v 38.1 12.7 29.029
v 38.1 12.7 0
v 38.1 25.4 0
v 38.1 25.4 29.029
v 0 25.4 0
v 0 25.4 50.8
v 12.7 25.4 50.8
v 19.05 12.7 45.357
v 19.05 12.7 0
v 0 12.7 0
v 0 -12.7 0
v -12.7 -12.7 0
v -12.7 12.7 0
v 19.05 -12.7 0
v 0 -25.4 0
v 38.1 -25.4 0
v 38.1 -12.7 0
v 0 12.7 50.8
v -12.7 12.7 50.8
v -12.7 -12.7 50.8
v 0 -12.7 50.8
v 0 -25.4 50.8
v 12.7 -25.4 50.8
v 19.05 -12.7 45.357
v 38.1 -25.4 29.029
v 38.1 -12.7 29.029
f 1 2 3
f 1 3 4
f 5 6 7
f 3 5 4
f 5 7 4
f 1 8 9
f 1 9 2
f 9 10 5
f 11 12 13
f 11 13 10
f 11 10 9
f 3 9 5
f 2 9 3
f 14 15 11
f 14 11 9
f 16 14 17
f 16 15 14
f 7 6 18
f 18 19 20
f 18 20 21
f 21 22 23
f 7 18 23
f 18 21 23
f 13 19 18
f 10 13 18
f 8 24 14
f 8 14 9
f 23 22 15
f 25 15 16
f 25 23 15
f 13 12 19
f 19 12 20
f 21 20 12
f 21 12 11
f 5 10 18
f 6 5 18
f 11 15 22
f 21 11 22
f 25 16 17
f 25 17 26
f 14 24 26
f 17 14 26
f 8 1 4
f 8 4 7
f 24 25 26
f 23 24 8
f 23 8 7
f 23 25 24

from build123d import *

# Parameters (mm, degrees)
F0_W     = 12.7
F0_H     = 50.8
F1_DEPTH = 25.4
F2_DEPTH = 12.7
F3_W     = 19.05
F3_H     = 25.4
F4_DEPTH = 50.8


with BuildPart() as f1:
    # F0 (on Front) → F1 (new body, symmetric)
    with BuildSketch(Plane.XZ):
        with Locations((6.35, 25.4)):
            Rectangle(F0_W, F0_H)
        Polygon((12.7, 50.8), (12.7, 0), (38.1, 0), (38.1, 29.028575), align=None)
    extrude(amount=F1_DEPTH, both=True)

    # F0 (on Front) → F2 (join, symmetric)
    with BuildSketch(Plane.XZ):
        with Locations((-6.35, 25.4)):
            Rectangle(F0_W, F0_H)
    extrude(amount=F2_DEPTH, both=True)

    # F3 (on Top) → F4 (cut)
    with BuildSketch(Plane.XY):
        with Locations((28.575, 0)):
            Rectangle(F3_W, F3_H)
    extrude(amount=F4_DEPTH, mode=Mode.SUBTRACT)


solid = f1.part
